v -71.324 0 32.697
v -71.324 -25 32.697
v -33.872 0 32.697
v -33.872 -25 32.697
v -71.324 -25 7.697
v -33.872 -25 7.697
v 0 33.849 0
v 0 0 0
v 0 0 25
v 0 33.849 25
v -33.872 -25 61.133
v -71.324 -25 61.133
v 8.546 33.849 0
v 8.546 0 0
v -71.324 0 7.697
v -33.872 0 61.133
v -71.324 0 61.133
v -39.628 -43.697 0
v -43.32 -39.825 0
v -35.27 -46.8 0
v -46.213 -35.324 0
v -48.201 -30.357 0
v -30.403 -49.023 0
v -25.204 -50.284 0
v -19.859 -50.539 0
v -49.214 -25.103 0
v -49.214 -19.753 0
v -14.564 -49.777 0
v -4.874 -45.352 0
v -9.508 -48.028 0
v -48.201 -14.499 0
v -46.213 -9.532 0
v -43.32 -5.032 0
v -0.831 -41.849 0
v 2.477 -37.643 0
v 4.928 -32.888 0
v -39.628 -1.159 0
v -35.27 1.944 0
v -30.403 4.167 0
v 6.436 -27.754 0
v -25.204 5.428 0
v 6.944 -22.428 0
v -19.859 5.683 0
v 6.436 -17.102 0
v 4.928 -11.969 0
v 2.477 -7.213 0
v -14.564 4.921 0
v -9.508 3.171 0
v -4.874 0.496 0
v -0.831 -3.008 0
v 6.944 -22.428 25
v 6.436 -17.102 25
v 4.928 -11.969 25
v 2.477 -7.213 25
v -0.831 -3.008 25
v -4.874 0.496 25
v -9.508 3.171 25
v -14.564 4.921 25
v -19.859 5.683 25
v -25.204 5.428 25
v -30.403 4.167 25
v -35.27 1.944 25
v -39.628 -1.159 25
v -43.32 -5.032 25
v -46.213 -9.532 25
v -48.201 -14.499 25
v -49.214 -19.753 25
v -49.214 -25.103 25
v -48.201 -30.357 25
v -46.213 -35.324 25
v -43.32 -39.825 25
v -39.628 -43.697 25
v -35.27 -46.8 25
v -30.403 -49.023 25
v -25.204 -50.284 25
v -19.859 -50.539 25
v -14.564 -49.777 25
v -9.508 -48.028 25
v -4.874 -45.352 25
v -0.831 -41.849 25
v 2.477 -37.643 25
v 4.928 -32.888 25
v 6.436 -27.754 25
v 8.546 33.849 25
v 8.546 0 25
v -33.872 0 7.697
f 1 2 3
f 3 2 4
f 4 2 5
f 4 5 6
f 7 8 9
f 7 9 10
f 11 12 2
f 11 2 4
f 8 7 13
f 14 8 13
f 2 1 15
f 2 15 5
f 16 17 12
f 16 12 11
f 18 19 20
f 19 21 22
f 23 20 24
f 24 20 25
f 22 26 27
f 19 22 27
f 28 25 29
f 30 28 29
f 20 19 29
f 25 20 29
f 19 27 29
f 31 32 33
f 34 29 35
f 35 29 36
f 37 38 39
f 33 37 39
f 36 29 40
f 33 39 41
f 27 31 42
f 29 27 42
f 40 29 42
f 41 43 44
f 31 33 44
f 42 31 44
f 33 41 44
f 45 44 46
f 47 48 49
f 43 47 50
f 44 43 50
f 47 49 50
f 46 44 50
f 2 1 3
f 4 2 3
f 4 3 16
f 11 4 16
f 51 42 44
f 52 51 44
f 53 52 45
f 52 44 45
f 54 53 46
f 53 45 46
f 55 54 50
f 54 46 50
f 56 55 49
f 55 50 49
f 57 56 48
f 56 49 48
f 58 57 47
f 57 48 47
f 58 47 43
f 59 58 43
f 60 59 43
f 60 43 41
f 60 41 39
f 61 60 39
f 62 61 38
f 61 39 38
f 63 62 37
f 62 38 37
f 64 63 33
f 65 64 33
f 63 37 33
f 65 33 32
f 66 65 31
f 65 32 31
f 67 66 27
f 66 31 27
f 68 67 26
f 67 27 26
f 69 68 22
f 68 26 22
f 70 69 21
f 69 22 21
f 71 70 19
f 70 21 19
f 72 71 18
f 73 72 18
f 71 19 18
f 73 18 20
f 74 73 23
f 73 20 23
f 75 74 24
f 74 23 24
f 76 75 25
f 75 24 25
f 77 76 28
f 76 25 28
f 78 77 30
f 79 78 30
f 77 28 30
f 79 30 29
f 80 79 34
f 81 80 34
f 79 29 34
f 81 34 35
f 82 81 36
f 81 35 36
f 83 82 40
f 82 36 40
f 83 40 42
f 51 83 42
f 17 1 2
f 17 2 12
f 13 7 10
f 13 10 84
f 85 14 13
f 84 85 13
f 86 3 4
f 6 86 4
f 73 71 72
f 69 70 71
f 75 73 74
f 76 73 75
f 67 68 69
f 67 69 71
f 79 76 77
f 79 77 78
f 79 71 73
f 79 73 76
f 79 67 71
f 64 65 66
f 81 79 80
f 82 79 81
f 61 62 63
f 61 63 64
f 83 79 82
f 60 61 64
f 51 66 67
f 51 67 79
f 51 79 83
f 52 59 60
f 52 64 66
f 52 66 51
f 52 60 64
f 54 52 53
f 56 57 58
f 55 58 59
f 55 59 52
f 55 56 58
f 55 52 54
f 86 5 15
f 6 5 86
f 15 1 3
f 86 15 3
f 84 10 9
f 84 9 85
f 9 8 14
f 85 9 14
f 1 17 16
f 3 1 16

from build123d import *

# Parameters (mm, degrees)
F0_W      = 8.546134
F0_H      = 33.849277
F1_DEPTH  = 25
F2_W      = 37.452027
F2_H      = 28.435953
F3_DEPTH  = 25
F4_R      = 28.142625
F5_DEPTH  = 25
F3_FACE_W = 37.452028
F3_FACE_H = 25
F6_DEPTH  = 25


with BuildPart() as f1:
    # F0 (on Top) → F1 (new body)
    with BuildSketch(Plane.XY):
        with Locations((4.273067, 16.924639)):
            Rectangle(F0_W, F0_H)
    extrude(amount=F1_DEPTH)


with BuildPart() as f3:
    # F2 (on Front) → F3 (new body)
    with BuildSketch(Plane.XZ):
        with Locations((-52.598067, 46.915014)):
            Rectangle(F2_W, F2_H)
    extrude(amount=F3_DEPTH)


with BuildPart() as f5:
    # F4 (on Top) → F5 (new body)
    with BuildSketch(Plane.XY):
        with Locations((-21.198543, -22.428136)):
            Circle(F4_R)
    extrude(amount=F5_DEPTH)


with BuildPart() as f6:
    # F3_face (on face) → F6 (new body)
    with BuildSketch(Plane(origin=(-52.598067, -12.5, 32.697037), x_dir=(1, 0, 0), z_dir=(0, 0, -1))):
        Rectangle(F3_FACE_W, F3_FACE_H)
    extrude(amount=F6_DEPTH)


solid = Compound([f1.part, f3.part, f5.part, f6.part])
